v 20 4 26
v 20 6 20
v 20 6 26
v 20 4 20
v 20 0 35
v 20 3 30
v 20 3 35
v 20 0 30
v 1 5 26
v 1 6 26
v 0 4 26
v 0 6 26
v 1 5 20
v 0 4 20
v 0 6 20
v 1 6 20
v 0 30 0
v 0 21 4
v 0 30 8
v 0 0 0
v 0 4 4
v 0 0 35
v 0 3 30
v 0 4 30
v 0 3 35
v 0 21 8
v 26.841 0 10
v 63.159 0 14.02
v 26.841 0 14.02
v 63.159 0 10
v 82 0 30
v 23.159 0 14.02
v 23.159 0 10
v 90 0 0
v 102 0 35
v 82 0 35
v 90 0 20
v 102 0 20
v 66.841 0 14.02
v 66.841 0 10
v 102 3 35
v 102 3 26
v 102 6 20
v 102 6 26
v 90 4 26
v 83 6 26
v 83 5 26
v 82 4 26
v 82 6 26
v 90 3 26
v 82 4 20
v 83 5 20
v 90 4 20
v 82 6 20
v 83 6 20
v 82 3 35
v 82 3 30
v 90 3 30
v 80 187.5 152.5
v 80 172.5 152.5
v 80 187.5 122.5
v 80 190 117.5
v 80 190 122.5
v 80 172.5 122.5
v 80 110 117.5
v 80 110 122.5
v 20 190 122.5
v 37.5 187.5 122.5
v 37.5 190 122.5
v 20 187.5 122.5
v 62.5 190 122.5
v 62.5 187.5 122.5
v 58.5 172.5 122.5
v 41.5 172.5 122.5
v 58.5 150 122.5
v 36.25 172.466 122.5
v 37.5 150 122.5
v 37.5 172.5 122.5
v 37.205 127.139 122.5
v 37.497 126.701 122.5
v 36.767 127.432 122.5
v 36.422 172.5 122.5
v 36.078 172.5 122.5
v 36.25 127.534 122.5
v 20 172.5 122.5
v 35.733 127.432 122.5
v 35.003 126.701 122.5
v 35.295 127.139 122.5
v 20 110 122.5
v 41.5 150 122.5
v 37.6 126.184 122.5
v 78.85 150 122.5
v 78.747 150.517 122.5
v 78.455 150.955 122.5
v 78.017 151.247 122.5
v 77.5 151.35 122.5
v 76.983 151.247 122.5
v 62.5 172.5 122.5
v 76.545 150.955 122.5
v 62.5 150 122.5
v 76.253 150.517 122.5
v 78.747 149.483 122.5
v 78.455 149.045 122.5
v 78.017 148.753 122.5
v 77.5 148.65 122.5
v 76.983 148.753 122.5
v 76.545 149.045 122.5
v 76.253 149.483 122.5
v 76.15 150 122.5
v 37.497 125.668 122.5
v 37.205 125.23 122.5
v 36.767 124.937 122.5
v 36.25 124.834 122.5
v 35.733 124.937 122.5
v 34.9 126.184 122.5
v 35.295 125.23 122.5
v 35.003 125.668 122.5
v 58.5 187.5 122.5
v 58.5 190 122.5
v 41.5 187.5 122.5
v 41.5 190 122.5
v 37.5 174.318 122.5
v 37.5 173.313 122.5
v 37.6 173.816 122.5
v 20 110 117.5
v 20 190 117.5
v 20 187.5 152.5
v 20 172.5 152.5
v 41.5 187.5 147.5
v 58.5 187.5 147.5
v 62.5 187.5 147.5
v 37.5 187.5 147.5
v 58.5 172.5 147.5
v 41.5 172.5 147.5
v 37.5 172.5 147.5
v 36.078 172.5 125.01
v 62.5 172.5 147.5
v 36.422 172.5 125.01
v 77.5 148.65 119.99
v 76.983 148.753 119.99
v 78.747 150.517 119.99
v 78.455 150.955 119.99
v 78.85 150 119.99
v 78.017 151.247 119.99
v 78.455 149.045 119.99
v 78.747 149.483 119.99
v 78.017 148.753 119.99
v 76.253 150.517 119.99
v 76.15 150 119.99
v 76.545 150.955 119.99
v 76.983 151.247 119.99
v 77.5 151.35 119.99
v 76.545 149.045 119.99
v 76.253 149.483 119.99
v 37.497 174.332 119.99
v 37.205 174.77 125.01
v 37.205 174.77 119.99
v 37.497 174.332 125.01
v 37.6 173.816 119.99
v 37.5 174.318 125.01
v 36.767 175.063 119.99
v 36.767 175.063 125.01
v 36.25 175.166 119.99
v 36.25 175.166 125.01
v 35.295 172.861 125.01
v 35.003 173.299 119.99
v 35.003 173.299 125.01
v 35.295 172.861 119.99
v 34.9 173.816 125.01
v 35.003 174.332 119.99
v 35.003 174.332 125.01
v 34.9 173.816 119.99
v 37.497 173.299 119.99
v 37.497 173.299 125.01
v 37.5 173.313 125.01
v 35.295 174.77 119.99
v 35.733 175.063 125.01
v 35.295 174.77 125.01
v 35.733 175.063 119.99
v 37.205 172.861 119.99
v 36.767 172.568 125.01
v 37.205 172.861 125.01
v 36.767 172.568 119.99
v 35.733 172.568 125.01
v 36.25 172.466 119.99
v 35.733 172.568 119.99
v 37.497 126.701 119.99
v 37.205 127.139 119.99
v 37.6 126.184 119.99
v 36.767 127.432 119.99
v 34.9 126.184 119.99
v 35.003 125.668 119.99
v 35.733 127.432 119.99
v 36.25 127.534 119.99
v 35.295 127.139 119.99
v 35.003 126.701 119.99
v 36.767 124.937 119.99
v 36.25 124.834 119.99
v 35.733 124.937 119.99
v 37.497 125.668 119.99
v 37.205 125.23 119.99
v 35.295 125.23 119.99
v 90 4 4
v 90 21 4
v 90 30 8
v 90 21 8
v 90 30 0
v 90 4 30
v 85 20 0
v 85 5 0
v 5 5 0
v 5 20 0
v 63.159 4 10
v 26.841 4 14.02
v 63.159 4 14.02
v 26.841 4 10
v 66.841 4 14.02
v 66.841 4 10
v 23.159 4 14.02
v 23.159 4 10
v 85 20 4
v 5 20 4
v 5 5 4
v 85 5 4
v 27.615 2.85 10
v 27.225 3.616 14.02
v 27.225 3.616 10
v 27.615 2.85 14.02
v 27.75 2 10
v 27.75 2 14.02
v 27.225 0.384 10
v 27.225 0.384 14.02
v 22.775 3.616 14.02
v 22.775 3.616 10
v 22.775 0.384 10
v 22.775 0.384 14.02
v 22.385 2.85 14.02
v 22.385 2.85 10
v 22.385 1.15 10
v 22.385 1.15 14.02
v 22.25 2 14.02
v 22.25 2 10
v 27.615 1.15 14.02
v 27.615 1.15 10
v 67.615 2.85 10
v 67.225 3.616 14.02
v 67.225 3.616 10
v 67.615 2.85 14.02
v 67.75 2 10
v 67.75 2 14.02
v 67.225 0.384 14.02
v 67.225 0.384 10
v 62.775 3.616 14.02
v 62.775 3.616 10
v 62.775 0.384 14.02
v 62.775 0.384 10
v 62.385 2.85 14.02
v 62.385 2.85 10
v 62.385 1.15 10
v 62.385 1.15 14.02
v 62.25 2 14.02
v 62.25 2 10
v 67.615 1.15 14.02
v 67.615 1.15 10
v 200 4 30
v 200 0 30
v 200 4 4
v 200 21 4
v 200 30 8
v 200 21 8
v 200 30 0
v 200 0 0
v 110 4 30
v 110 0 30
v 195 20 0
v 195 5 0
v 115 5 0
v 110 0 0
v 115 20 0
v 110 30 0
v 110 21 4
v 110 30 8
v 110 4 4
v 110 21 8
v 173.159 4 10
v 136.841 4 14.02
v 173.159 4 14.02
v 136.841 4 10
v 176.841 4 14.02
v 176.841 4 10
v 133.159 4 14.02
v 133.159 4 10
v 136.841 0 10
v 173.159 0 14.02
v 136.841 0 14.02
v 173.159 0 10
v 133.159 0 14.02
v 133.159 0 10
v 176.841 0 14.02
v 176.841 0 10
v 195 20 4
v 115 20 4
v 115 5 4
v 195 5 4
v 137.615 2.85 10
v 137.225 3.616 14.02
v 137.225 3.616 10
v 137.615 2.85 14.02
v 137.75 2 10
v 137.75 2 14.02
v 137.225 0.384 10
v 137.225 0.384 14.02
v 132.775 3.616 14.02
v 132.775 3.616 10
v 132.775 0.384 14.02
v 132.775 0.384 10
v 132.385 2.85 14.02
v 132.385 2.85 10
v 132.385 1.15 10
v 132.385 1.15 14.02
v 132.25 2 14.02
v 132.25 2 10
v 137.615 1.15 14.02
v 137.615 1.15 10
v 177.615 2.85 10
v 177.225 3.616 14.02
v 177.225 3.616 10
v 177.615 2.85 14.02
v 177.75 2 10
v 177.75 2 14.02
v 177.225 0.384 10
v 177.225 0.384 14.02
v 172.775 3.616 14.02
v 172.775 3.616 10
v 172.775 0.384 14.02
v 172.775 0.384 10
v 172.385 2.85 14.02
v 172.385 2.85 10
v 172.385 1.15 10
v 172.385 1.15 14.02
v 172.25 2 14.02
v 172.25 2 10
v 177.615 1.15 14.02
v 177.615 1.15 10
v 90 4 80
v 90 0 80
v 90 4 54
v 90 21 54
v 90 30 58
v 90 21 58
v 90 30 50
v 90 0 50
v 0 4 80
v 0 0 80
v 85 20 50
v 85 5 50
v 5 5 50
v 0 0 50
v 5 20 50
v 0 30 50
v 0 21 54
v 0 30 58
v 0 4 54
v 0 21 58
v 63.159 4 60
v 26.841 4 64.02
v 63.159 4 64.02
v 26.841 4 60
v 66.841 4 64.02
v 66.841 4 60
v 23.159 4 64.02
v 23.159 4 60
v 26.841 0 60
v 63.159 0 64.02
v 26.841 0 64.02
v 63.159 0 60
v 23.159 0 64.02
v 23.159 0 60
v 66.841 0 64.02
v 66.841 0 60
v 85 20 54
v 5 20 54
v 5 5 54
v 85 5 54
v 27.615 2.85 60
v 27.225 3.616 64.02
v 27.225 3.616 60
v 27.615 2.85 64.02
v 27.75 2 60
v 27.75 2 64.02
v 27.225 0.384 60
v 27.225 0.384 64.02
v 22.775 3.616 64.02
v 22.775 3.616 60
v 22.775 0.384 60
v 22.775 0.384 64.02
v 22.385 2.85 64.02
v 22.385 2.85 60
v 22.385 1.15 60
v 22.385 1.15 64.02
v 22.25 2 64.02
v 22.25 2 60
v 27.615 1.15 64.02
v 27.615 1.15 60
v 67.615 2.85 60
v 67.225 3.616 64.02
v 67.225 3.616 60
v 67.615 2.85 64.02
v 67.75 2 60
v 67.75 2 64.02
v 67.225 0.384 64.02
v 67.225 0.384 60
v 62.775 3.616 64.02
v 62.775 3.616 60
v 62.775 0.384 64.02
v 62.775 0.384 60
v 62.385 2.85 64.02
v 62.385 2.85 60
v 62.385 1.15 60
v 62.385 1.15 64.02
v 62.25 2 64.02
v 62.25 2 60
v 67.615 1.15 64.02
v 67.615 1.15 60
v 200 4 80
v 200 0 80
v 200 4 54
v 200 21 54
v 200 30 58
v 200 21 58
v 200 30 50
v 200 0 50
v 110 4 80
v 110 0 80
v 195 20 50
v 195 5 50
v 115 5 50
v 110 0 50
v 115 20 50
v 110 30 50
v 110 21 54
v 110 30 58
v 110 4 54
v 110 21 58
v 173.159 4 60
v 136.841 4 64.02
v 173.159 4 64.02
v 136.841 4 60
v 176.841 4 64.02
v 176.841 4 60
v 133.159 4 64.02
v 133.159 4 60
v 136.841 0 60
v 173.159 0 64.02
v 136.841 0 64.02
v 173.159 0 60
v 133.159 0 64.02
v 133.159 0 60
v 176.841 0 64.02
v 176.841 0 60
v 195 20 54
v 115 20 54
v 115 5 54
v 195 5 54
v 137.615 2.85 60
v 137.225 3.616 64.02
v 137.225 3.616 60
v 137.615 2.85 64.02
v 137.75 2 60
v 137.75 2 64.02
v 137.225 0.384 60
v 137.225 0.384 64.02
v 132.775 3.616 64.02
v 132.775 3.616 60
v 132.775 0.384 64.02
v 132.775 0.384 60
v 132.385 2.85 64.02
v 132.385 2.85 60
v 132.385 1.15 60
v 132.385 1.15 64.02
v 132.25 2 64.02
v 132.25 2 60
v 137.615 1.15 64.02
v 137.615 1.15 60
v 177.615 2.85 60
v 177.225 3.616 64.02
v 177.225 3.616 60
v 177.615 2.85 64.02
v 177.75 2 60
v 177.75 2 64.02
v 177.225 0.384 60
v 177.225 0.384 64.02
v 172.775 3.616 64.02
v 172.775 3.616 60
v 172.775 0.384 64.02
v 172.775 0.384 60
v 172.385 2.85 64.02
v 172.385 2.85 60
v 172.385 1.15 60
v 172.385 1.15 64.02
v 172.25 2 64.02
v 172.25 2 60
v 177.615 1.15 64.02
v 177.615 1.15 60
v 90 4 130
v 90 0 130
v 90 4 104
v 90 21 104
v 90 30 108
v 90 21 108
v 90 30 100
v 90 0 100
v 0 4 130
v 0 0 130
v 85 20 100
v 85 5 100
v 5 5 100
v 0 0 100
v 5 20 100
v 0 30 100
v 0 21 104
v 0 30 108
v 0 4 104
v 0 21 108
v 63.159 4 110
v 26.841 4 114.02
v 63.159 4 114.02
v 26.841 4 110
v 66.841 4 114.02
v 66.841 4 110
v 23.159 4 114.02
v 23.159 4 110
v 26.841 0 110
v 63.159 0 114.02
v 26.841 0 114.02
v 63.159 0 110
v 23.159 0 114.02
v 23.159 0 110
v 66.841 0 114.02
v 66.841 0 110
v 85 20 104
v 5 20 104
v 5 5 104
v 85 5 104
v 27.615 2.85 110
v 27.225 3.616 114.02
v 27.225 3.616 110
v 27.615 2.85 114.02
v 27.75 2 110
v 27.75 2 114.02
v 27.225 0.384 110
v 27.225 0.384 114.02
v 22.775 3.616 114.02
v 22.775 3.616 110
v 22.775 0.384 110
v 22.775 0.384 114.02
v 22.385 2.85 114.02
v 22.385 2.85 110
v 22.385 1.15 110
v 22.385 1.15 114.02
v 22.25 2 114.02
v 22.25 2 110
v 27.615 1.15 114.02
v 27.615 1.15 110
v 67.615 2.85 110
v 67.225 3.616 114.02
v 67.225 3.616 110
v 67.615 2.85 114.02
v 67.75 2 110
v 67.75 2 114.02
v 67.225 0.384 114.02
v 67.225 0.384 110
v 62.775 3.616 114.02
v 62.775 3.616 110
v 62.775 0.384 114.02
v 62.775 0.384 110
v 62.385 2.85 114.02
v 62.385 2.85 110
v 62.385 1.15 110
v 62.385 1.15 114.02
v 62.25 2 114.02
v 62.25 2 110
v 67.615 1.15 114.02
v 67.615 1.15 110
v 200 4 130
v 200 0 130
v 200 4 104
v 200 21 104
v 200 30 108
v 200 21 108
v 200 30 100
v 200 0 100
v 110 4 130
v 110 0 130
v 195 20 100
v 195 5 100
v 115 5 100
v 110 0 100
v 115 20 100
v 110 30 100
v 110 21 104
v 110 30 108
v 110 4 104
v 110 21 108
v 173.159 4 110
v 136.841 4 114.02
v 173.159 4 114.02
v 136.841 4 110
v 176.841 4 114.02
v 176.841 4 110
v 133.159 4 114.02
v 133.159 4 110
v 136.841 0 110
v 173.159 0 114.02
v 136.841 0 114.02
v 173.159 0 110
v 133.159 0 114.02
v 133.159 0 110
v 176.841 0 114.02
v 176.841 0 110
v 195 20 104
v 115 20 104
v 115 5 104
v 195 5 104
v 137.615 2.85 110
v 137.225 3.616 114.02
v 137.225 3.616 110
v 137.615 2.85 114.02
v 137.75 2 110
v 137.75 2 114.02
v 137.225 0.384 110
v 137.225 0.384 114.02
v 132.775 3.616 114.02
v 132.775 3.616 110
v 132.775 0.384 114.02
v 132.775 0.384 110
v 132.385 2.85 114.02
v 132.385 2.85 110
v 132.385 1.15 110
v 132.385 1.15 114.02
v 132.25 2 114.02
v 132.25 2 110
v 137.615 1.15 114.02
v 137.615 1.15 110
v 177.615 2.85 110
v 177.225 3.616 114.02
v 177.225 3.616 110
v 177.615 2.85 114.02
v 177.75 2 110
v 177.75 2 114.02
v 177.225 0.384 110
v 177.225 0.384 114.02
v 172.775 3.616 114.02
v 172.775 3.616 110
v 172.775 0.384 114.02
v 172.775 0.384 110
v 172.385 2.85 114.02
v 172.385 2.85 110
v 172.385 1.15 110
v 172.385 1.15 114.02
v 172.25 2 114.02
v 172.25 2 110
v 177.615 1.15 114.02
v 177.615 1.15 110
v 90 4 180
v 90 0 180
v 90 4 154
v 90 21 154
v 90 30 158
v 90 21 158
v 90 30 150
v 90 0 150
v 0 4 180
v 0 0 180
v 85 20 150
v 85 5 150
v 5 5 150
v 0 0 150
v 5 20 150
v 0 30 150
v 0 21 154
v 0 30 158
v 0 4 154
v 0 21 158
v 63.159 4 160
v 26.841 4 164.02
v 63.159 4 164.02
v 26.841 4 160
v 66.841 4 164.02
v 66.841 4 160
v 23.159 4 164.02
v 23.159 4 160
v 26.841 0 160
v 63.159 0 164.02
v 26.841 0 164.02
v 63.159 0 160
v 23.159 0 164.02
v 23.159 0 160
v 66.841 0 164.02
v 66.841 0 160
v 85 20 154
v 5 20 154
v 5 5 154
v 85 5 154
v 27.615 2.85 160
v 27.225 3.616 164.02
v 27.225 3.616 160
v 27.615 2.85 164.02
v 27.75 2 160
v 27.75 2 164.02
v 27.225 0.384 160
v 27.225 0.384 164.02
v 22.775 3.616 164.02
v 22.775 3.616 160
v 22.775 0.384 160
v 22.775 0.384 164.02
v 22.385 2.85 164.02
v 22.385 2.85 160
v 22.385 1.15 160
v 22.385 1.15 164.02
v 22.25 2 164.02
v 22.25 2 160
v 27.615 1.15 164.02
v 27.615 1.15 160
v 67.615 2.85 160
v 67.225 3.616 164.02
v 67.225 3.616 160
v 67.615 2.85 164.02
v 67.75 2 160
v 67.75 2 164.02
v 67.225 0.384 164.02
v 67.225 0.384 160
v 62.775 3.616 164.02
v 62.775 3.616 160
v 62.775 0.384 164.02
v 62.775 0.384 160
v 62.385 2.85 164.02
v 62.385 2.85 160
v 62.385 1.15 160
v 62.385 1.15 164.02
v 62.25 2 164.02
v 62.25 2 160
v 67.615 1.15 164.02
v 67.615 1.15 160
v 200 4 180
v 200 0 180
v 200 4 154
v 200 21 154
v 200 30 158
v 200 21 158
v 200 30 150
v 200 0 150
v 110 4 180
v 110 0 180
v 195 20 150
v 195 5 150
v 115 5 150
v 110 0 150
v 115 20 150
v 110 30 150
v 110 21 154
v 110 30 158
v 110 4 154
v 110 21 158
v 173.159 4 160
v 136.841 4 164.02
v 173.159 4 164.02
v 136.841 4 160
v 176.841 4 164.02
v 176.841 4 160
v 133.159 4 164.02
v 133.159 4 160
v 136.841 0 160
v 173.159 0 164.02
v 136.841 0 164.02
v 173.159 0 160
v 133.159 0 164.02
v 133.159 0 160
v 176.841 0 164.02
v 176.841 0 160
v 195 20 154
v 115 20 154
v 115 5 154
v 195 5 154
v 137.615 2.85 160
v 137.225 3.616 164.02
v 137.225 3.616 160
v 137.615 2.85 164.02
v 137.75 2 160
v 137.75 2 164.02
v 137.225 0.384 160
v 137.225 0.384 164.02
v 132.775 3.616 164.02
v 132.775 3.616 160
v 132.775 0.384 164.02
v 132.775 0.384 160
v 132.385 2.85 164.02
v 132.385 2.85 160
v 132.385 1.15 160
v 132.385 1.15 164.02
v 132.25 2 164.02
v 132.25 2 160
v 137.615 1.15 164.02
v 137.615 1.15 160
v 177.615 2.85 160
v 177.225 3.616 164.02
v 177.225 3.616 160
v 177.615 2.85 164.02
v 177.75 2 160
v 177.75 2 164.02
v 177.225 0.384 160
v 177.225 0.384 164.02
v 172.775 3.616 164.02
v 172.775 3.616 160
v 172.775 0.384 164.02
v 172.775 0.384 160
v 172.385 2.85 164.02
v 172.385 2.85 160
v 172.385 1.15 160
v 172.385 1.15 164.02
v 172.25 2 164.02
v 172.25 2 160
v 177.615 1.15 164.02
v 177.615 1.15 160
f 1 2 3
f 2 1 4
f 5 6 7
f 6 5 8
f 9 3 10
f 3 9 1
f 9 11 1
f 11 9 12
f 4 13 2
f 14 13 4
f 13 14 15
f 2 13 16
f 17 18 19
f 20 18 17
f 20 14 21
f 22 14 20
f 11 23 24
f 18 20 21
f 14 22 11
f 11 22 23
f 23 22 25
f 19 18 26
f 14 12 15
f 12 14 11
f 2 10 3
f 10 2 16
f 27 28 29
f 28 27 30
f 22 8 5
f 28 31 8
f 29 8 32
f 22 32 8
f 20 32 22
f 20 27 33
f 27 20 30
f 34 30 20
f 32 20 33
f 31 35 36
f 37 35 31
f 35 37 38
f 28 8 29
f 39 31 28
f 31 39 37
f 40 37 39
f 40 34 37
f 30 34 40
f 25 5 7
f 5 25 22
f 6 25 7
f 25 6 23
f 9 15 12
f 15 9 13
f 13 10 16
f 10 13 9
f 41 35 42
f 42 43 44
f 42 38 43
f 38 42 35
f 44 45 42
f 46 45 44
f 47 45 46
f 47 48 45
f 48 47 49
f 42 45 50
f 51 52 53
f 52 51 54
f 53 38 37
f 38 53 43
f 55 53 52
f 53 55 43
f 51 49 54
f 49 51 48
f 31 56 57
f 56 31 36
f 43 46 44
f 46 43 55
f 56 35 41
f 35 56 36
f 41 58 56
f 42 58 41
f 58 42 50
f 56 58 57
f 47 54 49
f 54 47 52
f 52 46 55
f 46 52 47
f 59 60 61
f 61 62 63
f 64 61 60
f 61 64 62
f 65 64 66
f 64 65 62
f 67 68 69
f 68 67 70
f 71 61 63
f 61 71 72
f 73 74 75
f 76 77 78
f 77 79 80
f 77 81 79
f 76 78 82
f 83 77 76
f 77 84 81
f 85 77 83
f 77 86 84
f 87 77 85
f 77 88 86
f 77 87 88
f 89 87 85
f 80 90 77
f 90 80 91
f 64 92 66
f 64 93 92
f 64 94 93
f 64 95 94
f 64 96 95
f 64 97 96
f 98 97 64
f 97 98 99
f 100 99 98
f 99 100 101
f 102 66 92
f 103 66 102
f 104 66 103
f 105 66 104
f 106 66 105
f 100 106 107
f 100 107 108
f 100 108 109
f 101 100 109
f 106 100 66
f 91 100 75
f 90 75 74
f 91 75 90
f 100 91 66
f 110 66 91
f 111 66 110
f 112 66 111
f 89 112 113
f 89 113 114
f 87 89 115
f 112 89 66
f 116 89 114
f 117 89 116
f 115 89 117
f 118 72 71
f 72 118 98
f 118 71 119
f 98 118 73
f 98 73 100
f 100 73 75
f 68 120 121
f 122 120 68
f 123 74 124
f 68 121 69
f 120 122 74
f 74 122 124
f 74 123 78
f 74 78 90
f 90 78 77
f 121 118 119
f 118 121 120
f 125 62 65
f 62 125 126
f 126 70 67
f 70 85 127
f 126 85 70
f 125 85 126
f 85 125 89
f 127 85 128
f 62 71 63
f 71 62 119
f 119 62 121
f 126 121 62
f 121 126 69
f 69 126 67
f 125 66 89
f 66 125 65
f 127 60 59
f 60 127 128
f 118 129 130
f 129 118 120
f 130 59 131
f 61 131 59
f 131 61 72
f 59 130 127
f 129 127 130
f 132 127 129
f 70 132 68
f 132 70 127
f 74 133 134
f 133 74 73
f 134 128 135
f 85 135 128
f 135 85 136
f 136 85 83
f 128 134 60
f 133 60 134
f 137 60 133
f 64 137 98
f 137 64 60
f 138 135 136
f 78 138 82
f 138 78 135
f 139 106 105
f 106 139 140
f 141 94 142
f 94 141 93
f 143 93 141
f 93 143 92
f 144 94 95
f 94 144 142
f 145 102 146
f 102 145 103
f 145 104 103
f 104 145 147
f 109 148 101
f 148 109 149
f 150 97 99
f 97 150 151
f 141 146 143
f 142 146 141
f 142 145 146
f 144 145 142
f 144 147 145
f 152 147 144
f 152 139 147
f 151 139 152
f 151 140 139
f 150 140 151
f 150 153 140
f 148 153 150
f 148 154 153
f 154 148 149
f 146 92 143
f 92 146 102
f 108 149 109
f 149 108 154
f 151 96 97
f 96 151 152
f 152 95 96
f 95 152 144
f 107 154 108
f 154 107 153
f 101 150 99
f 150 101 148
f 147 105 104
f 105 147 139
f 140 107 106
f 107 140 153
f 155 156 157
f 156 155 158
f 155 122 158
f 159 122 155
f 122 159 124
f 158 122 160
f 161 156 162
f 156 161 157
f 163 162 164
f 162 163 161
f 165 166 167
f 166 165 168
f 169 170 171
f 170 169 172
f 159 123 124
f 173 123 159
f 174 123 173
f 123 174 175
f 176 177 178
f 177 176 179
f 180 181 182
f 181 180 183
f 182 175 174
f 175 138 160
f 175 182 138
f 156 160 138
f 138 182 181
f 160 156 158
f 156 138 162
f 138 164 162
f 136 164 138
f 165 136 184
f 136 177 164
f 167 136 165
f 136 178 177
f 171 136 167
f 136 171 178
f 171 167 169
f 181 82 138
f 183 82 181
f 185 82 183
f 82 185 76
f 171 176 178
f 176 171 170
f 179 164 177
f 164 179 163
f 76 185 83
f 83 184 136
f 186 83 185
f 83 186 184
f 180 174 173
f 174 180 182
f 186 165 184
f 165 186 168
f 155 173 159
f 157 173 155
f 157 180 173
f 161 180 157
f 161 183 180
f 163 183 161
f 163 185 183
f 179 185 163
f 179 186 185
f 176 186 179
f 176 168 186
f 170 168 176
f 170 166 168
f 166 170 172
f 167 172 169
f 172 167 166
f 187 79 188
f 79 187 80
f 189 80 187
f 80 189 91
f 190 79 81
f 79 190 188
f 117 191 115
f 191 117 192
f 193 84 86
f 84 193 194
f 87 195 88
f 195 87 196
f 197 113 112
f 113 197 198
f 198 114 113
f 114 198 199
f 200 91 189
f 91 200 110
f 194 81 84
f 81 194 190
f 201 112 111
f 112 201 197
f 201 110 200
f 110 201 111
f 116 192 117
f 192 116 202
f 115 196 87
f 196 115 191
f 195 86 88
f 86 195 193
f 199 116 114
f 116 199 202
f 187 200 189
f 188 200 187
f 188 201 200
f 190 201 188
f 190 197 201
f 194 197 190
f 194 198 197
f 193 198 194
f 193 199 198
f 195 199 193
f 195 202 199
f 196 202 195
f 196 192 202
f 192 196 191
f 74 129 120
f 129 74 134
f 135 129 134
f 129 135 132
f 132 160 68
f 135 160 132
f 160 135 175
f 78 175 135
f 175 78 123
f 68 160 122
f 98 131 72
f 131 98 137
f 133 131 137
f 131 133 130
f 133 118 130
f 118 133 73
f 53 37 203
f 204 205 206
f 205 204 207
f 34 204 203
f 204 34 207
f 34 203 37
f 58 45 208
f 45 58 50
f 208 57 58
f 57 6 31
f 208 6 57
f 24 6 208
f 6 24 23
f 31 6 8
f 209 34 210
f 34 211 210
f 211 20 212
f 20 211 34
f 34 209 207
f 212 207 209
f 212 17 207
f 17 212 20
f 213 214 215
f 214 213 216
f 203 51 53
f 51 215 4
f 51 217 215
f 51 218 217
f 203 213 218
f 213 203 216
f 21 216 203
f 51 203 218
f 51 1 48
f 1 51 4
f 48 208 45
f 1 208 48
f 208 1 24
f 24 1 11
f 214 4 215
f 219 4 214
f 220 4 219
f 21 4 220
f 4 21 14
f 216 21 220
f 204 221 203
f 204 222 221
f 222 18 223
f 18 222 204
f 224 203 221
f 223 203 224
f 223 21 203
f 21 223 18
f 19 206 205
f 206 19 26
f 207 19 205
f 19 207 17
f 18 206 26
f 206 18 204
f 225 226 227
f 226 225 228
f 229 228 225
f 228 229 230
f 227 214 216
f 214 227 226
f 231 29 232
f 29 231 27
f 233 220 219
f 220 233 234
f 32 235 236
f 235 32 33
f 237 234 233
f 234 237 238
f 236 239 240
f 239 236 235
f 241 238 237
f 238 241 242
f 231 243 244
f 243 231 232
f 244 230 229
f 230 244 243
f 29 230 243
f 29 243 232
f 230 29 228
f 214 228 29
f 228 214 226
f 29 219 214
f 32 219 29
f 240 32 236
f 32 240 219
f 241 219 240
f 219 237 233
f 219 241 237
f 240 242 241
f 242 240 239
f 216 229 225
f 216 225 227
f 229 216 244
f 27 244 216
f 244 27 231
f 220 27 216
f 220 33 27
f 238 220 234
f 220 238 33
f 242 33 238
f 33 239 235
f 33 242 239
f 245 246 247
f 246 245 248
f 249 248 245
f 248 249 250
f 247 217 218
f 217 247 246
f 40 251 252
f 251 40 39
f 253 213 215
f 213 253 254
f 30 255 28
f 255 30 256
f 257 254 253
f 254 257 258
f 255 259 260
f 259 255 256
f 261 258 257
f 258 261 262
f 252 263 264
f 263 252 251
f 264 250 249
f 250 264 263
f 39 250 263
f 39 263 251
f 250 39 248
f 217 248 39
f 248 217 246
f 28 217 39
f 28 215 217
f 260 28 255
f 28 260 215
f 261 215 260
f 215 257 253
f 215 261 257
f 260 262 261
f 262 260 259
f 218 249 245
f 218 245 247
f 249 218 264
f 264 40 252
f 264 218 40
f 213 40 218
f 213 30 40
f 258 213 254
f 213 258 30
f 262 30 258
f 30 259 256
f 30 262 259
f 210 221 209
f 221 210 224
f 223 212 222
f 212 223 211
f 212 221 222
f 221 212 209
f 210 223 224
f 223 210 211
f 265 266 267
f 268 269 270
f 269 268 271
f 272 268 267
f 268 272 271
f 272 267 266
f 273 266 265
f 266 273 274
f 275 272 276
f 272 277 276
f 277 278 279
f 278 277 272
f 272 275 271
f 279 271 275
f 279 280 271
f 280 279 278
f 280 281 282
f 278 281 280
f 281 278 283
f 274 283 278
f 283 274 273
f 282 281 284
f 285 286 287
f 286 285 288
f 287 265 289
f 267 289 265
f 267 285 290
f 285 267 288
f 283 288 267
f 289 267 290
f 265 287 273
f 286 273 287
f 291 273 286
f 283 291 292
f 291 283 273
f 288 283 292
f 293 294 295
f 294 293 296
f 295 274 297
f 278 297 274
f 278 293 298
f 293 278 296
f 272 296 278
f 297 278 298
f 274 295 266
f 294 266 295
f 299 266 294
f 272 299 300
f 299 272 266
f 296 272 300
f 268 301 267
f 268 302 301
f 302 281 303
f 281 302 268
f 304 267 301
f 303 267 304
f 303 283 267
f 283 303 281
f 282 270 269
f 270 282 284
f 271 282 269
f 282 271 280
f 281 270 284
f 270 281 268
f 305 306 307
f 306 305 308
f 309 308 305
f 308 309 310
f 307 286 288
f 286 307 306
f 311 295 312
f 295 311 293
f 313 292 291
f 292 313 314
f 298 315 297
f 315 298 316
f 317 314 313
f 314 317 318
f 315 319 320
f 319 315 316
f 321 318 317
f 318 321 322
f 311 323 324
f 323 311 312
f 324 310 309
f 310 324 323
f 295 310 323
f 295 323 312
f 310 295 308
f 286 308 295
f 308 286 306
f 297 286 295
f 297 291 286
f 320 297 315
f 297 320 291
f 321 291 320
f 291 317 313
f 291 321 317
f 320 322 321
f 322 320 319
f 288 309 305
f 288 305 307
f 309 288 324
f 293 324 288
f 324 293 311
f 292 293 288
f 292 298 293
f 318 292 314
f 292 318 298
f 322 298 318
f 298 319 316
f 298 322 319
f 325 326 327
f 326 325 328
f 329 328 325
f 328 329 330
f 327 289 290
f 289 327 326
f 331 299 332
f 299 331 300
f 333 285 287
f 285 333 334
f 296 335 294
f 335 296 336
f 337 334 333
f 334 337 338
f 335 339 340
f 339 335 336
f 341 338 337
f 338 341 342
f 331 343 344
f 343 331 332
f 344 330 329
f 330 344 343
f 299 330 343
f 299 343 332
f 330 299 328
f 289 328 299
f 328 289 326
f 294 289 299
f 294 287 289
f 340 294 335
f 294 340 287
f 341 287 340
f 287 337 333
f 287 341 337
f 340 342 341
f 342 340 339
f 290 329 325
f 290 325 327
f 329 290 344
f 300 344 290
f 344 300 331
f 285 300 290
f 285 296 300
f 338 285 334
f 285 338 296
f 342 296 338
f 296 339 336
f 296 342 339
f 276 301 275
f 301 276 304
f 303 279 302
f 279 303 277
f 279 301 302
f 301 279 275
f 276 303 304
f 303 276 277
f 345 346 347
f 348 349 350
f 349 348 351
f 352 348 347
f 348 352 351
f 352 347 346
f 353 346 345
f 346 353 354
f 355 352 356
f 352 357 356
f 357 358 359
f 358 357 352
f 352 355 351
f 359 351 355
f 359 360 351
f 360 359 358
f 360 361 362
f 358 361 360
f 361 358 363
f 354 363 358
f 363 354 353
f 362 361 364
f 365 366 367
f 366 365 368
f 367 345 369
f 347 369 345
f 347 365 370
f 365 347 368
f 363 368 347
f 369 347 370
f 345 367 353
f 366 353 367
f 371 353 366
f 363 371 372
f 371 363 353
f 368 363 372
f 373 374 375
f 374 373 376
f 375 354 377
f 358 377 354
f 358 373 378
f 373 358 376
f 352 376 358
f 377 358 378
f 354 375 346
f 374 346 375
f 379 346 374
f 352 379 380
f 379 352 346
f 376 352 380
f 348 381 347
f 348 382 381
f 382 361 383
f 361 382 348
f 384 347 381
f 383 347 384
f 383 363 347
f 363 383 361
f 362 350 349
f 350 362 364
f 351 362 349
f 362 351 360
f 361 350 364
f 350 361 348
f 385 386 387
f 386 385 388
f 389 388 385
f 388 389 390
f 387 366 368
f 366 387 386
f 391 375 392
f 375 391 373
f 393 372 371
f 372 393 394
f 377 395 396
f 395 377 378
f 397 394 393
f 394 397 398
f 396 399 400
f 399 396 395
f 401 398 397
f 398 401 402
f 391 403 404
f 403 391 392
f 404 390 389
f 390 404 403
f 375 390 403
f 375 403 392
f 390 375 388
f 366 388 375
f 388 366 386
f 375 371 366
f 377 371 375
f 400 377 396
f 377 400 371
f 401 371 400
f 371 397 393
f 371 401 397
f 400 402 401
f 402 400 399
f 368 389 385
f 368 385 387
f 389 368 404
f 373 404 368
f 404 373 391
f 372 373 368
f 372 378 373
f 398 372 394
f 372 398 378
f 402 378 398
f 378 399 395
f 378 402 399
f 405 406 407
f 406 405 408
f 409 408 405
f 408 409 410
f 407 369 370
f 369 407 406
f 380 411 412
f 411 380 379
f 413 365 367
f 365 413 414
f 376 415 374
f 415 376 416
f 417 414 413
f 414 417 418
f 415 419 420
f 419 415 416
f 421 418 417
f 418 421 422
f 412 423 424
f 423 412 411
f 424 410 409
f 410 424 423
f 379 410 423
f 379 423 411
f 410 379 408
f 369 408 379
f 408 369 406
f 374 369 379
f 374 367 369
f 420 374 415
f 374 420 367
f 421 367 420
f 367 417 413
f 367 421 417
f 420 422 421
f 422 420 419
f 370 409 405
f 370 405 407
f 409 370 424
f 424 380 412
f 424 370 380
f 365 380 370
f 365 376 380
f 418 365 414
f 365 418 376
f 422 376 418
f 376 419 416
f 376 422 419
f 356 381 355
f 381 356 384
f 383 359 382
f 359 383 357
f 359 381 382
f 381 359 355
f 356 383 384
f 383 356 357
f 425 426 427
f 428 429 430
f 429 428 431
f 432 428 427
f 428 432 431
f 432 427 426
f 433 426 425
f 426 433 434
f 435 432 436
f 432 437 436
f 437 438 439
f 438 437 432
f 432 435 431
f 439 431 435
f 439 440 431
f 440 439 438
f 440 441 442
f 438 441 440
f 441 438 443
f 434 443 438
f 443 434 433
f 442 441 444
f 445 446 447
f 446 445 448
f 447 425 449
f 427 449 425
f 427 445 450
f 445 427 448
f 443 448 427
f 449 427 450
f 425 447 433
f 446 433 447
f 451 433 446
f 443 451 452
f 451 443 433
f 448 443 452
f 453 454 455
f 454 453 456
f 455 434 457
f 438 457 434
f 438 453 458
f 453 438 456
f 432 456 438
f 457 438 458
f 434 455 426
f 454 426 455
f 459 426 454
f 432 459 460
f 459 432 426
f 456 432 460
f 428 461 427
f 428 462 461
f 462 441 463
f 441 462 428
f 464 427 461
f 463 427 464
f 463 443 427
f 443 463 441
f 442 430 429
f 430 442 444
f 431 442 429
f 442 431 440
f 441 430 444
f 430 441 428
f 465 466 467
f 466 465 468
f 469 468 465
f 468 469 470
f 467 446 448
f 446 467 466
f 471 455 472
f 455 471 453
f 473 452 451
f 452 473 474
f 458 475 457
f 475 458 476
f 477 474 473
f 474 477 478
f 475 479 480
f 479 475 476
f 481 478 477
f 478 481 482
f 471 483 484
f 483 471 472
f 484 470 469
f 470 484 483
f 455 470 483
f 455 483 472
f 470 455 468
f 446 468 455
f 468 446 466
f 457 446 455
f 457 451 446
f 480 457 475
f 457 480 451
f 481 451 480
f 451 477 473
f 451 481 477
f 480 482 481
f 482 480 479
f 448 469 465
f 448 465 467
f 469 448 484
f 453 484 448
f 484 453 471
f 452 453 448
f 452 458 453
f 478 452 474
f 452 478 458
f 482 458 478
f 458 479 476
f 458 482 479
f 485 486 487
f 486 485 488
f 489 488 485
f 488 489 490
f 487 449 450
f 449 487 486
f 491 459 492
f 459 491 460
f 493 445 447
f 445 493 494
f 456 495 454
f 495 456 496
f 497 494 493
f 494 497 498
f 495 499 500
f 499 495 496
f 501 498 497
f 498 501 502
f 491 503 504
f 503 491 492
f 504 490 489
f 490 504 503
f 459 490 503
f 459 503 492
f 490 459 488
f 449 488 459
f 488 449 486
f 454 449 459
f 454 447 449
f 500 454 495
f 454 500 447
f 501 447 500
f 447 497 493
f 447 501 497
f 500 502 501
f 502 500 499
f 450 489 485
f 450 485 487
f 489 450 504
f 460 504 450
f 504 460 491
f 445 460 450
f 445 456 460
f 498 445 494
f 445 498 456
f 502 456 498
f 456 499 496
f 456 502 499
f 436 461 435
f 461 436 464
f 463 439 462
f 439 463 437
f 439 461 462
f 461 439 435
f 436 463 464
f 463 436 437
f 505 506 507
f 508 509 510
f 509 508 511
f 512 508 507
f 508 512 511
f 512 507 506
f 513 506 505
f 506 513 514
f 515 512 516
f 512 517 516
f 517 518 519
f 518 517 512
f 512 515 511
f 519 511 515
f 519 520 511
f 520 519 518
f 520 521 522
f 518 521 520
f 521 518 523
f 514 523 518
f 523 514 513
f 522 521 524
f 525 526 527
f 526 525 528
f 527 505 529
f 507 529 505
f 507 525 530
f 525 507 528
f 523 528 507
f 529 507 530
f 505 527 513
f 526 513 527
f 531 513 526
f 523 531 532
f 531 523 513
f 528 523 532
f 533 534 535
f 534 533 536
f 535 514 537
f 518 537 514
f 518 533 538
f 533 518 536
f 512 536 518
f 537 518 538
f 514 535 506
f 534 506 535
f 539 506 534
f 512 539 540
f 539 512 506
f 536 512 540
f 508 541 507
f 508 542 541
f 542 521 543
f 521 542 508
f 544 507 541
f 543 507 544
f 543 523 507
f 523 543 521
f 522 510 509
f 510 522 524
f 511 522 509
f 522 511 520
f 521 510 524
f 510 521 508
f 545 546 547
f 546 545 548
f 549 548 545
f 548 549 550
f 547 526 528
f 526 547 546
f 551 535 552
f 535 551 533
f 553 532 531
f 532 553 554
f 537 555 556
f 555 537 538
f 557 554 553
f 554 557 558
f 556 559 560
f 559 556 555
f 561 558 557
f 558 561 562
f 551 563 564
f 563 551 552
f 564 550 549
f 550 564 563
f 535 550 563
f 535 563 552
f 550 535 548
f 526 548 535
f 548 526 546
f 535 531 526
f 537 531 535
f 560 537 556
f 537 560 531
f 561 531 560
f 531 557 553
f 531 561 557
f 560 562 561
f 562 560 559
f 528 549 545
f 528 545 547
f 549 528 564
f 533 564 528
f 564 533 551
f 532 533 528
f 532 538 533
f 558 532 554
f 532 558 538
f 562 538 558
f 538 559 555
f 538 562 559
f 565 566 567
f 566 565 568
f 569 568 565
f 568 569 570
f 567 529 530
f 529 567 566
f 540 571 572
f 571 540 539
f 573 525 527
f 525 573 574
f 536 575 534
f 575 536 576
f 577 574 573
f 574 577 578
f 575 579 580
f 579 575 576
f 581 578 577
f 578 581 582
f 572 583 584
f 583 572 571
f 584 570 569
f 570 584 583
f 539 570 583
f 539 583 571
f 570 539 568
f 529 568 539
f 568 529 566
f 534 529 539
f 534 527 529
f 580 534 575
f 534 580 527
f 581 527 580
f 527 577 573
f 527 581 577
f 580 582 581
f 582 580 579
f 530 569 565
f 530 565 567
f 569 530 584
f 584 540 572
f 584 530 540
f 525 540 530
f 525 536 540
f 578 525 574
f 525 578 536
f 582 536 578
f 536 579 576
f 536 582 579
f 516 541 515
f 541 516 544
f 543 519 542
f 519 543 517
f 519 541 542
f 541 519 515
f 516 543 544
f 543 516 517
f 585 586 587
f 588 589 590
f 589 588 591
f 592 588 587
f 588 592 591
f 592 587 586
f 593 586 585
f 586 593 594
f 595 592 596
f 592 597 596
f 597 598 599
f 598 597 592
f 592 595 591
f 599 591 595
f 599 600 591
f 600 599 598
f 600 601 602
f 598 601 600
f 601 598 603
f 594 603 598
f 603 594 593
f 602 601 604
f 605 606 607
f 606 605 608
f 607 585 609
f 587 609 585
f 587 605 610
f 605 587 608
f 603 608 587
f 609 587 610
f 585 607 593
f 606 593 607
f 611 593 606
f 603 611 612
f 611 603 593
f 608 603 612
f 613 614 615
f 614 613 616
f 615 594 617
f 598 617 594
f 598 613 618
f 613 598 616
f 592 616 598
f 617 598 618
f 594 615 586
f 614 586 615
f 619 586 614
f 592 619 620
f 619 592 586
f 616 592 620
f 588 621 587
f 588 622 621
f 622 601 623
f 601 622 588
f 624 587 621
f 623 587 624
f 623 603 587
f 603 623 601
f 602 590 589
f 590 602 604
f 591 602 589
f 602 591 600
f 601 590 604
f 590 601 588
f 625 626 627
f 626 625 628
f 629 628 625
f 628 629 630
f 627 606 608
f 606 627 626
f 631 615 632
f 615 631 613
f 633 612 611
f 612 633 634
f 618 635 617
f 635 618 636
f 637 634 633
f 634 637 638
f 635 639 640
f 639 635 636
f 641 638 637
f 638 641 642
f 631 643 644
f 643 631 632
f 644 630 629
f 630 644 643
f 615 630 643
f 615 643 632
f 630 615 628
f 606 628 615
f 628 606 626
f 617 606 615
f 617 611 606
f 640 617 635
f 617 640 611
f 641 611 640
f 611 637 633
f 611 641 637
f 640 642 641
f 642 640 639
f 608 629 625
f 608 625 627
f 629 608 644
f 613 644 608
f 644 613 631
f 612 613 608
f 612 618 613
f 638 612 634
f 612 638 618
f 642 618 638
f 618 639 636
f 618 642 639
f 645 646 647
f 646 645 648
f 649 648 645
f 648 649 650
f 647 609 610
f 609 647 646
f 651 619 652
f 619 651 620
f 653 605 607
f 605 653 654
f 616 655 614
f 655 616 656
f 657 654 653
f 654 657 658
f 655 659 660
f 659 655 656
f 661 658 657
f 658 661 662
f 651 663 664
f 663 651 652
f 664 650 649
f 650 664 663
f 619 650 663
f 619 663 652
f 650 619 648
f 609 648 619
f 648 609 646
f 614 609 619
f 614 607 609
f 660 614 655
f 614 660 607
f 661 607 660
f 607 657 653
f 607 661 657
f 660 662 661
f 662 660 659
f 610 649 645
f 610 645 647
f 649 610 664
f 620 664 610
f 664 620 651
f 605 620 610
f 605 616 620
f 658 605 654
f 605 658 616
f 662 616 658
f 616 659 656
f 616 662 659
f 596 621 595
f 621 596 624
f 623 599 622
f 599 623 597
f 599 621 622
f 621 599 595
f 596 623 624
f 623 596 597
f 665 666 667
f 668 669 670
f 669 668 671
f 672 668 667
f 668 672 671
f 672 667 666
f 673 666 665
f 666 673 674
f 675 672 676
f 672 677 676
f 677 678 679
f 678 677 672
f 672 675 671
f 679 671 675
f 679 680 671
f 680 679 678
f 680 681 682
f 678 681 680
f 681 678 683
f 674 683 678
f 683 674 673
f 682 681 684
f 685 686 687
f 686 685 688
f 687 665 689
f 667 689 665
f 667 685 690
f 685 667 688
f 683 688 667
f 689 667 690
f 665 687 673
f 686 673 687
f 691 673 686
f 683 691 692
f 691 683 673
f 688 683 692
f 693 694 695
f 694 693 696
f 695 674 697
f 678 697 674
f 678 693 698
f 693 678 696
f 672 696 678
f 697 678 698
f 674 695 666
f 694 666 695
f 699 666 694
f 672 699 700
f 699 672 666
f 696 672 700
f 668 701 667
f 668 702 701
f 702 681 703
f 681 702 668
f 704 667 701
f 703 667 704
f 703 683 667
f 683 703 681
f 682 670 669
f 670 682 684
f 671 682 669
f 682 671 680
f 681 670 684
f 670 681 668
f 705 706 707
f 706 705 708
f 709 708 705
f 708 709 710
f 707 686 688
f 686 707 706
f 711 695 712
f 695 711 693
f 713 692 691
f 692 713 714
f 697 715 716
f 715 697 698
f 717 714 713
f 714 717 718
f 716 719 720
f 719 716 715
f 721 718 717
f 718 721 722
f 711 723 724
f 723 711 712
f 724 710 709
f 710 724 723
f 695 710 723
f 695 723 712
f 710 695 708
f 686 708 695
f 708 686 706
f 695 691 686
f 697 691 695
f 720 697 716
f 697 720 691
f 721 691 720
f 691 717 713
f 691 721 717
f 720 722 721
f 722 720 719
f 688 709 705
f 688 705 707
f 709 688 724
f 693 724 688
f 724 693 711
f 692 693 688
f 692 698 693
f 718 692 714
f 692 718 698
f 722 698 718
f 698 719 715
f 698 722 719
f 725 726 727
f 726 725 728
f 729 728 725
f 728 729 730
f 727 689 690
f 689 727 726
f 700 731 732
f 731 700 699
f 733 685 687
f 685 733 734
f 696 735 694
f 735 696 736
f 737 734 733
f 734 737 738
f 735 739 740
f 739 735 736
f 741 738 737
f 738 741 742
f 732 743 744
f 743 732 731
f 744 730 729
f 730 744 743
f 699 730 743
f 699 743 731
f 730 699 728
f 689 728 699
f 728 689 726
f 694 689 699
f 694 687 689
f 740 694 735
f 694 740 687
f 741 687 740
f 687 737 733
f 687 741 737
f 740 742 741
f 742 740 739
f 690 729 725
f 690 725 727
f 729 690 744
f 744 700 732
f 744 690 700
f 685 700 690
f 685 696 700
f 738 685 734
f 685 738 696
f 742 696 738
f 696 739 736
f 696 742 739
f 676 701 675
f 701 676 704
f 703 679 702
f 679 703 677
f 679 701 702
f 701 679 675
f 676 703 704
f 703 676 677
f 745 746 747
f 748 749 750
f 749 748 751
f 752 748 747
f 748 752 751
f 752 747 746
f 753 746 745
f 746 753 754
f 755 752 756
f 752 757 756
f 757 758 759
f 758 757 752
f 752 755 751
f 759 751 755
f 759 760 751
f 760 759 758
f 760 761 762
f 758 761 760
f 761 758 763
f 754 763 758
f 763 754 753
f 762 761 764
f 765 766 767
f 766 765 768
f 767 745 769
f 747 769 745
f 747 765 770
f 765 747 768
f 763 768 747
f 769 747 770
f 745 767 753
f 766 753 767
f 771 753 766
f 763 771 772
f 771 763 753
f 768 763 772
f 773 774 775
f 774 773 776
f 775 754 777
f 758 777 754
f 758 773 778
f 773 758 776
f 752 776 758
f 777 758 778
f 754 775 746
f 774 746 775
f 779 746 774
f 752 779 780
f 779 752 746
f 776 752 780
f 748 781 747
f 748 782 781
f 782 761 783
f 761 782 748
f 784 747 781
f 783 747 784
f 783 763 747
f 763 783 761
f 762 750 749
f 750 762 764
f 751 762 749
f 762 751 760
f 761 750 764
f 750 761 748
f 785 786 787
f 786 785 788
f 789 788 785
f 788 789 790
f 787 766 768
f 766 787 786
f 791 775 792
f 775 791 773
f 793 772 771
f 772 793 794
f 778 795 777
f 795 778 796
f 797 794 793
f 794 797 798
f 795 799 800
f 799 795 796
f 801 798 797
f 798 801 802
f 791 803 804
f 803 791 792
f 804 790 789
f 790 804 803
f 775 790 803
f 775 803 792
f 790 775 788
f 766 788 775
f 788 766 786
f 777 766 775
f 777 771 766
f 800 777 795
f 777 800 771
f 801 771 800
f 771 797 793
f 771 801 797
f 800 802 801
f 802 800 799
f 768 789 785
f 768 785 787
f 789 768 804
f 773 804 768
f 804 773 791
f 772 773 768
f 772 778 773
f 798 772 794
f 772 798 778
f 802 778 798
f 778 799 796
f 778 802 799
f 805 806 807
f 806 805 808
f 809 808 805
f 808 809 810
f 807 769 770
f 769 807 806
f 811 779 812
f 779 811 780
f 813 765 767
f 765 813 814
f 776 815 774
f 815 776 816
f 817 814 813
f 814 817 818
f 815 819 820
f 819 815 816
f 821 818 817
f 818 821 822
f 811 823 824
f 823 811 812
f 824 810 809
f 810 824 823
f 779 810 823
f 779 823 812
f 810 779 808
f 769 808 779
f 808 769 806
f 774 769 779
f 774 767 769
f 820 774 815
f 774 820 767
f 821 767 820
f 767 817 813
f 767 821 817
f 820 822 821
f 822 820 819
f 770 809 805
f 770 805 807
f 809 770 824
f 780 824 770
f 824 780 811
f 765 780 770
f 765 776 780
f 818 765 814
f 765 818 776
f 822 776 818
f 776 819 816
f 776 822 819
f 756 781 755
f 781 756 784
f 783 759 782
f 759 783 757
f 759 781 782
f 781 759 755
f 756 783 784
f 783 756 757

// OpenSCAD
/*
  LEGO AI SORTING MACHINE - ACCESSORIES MODULE

  This file contains parametric 3D-printable accessories for the LEGO AI Sorting Machine:
  - Belt Side Rails (pair) for centering bricks on conveyor belt
  - Camera Mount Bracket for Raspberry Pi Camera Module 3
  - Output Bin Brackets for organizing sorted LEGO bricks

  ======================================================================================
  PRINT OPTIMIZATION STRATEGY
  ======================================================================================

  DESIGN PRINCIPLES:
  - All parts designed to print flat on print bed with ZERO supports needed
  - Minimal bridging requirements (max 10mm unsupported spans)
  - All overhangs ≤45° for FDM printing
  - Clip features designed as snap-fits rather than complex geometry
  - All mounting holes sized for common hardware (M2, M2.5, M3, M5)

  PRINT SETTINGS (VERIFIED):
  - Layer Height: 0.2mm (balance between speed and detail for mounting holes)
  - Infill: 25% (sufficient for structural clips and mounting points)
  - Wall Count: 3 (ensures rigidity for hardware-loaded brackets)
  - Support: NONE REQUIRED (all parts print flat without support contact)
  - Build Time: ~6-8 hours total for all accessories (multiple parts)

  PART-SPECIFIC NOTES:

  Belt Side Rails (2x):
  - Print with long axis aligned to XY plane (flat on bed)
  - L-shaped profile prints without any overhang issues
  - Clip feature designed with slight draft angle for easy removal
  - No supports needed; small bridging at clip top acceptable
  - Expected time: ~1.5 hours per rail

  Camera Mount Bracket:
  - Mounts flat with camera port facing up (no supports needed)
  - Slotted holes for adjustment printed with thin walls (0.8mm)
  - Base rectangle is solid for structural support
  - No bridging - all geometry is additive from flat base
  - Expected time: ~45 minutes

  Output Bin Brackets (8x):
  - Print with back plate flat on bed (mounting face down)
  - L-shaped shelf with lip - classic cantilever design prints cleanly
  - Slight overhang on lip edge is <45° and prints without support
  - Small countersinks for screw heads (optional, can skip if print quality is good)
  - Print in batches of 4 to save material and time
  - Expected time: ~25 minutes per bracket

  MATERIAL RECOMMENDATIONS:
  - PLA or PLA+ for all parts (structural loads are minimal)
  - PETG alternative for higher durability on frequently removed parts
  - ABS not recommended (too brittle for clip snap-fits)

  ======================================================================================
  DIMENSION STANDARDS
  ======================================================================================

  Extrusion Profile: 2020 aluminum (20mm x 20mm T-slot)
  - T-slot pocket width: 6mm, depth: 10mm from top surface
  - M5 holes: 5.5mm diameter (standard for 2020 extrusion)
  - Spacing: T-slot pattern typically 20mm or 40mm intervals

  Hardware:
  - M2 (Pi Camera Module 3): 2.2mm hole, 3.6mm head
  - M2.5 (camera mount ring): 2.7mm hole, 4.5mm head
  - M3 (small accessories): 3.4mm hole, 5.5mm head
  - M5 (extrusion brackets): 5.5mm hole, 8mm head

  ======================================================================================
*/

// ============================================================================
// PARAMETRIC DIMENSIONS & CONFIGURATION
// ============================================================================

// Global tolerance and print optimization
EPSILON = 0.01;        // Tolerance for OpenSCAD
MIN_WALL = 0.8;        // Minimum wall thickness for FDM
PRINT_LAYER = 0.2;     // Layer height

// Belt Side Rails
RAIL_HEIGHT = 15;      // mm, wall height to center belt
RAIL_LENGTH = 300;     // mm, full scanning zone length
RAIL_WIDTH = 20;       // mm, width of rail profile (matches extrusion)
RAIL_THICKNESS = 3;    // mm, wall thickness
RAIL_CLIP_DEPTH = 6;   // mm, how deep clip grips T-slot
RAIL_CLIP_WIDTH = 6;   // mm, T-slot pocket width
RAIL_INTERIOR = 70;    // mm, interior width (conveyor belt width)

// Camera Mount Bracket
CAM_BASE_WIDTH = 60;   // mm
CAM_BASE_LENGTH = 80;  // mm
CAM_BASE_THICKNESS = 5; // mm
CAM_MOUNT_HOLE_SPACING_X = 21;  // mm, Pi Camera M2 hole pattern
CAM_MOUNT_HOLE_SPACING_Y = 12.5; // mm, Pi Camera M2 hole pattern
CAM_MOUNT_HOLE_DIAMETER = 2.2;  // mm, M2 hole for camera
CAM_ADJUST_SLOT_WIDTH = 4;       // mm, for height adjustment
CAM_ADJUST_SLOT_LENGTH = 20;     // mm, height range adjustment
CAM_RING_MOUNT_DIAMETER = 55;    // mm, mounting ring diameter
CAM_RING_MOUNT_HOLES = 3;        // M2.5 holes on circle
CAM_RING_MOUNT_HOLE_DIA = 2.7;   // mm, M2.5 hole

// Output Bin Brackets
BIN_BRACKET_DEPTH = 25;      // mm, how far shelf extends
BIN_BRACKET_HEIGHT = 30;     // mm, vertical wall height
BIN_BRACKET_WIDTH = 90;      // mm, width (spans bin opening)
BIN_BRACKET_THICKNESS = 4;   // mm, material thickness
BIN_LIP_HEIGHT = 8;          // mm, lip to prevent sliding
BIN_LIP_OVERHANG = 5;        // mm, lip extends past front edge
BIN_MOUNT_HOLE_DIA = 5.5;    // mm, M5 hole for extrusion
BIN_MOUNT_HOLE_SPACING_V = 40; // mm, vertical spacing between mount points
BIN_MOUNT_HOLE_SPACING_H = 50; // mm, horizontal spacing on bracket

// ============================================================================
// BELT SIDE RAILS - L-SHAPED CLIP TO KEEP BRICKS CENTERED
// ============================================================================

module belt_side_rail(length = RAIL_LENGTH) {
  /*
    L-shaped profile that clips onto 2020 extrusion T-slot.
    Interior surface is smooth to guide conveyor belt.
    Designed to print flat without supports.
  */

  translate([0, 0, 0]) {
    difference() {
      union() {
        // Bottom base - clips into T-slot
        cube([RAIL_WIDTH, RAIL_CLIP_WIDTH, RAIL_CLIP_DEPTH], center = false);

        // Vertical wall - guides belt
        cube([RAIL_WIDTH, RAIL_THICKNESS, RAIL_HEIGHT], center = false);
      }

      // Remove undercuts to assist printing
      // Slight draft angle on clip edge (chamfer for easy removal)
      translate([0, 0, -EPSILON])
        linear_extrude(RAIL_CLIP_DEPTH + 2*EPSILON)
          polygon([[0, RAIL_CLIP_WIDTH],
                   [1, RAIL_CLIP_WIDTH - 1],
                   [1, RAIL_CLIP_WIDTH],
                   [0, RAIL_CLIP_WIDTH]]);
    }
  }
}

// ============================================================================
// CAMERA MOUNT BRACKET - ADJUSTABLE HEIGHT FOR PI CAMERA
// ============================================================================

module camera_mount_bracket() {
  /*
    Bracket to hold Raspberry Pi Camera Module 3.
    Features slotted mounting holes for height adjustment.
    Mounts to scanning chamber top ring via M2.5 holes.
    Camera ports downward into scanning zone.
  */

  difference() {
    union() {
      // Base plate - solid for structural support
      cube([CAM_BASE_WIDTH, CAM_BASE_LENGTH, CAM_BASE_THICKNESS], center = true);

      // Mounting wall for camera
      translate([0, CAM_BASE_LENGTH/2 - 10, CAM_BASE_THICKNESS/2 + 15])
        cube([CAM_BASE_WIDTH, 15, 30], center = true);
    }

    // M2.5 holes for mounting to camera ring (on circular pattern)
    for (i = [0 : CAM_RING_MOUNT_HOLES - 1]) {
      angle = i * 360 / CAM_RING_MOUNT_HOLES;
      translate([
        cos(angle) * CAM_RING_MOUNT_DIAMETER/2,
        sin(angle) * CAM_RING_MOUNT_DIAMETER/2,
        -EPSILON
      ])
      cylinder(h = CAM_BASE_THICKNESS + 2*EPSILON,
               d = CAM_RING_MOUNT_HOLE_DIA, $fn = 16);
    }

    // Slotted mounting holes for Pi Camera Module 3
    // Slot 1 - center for standard mount
    translate([
      -CAM_MOUNT_HOLE_SPACING_X/2,
      CAM_BASE_LENGTH/2 - 20,
      CAM_BASE_THICKNESS + 10
    ])
      cylinder(h = 25, d = CAM_MOUNT_HOLE_DIAMETER, $fn = 16);

    // Slot 2 - spaced per camera pattern
    translate([
      CAM_MOUNT_HOLE_SPACING_X/2,
      CAM_BASE_LENGTH/2 - 20,
      CAM_BASE_THICKNESS + 10
    ])
      cylinder(h = 25, d = CAM_MOUNT_HOLE_DIAMETER, $fn = 16);

    // Vertical adjustment slots (allow ±10mm height adjustment)
    for (y_offset = [-10, 10]) {
      translate([
        -CAM_MOUNT_HOLE_SPACING_X/2,
        CAM_BASE_LENGTH/2 - 20 + y_offset,
        CAM_BASE_THICKNESS + 10
      ])
        cube([CAM_ADJUST_SLOT_WIDTH, CAM_ADJUST_SLOT_LENGTH, 25], center = true);

      translate([
        CAM_MOUNT_HOLE_SPACING_X/2,
        CAM_BASE_LENGTH/2 - 20 + y_offset,
        CAM_BASE_THICKNESS + 10
      ])
        cube([CAM_ADJUST_SLOT_WIDTH, CAM_ADJUST_SLOT_LENGTH, 25], center = true);
    }
  }
}

// ============================================================================
// OUTPUT BIN BRACKET - L-SHAPED SHELF WITH LIP
// ============================================================================

module output_bin_bracket() {
  /*
    L-shaped bracket to hold output bins under gate tree.
    Features:
    - Vertical mounting plate with M5 holes for 2020 extrusion
    - Horizontal shelf to support bins
    - Front lip to prevent bin sliding
    - Designed for stacking at multiple heights
  */

  difference() {
    union() {
      // Vertical mounting plate
      cube([BIN_BRACKET_WIDTH, BIN_BRACKET_THICKNESS, BIN_BRACKET_HEIGHT],
           center = false);

      // Horizontal shelf
      cube([BIN_BRACKET_WIDTH, BIN_BRACKET_DEPTH, BIN_BRACKET_THICKNESS],
           center = false);

      // Front lip to prevent bin sliding
      translate([0, BIN_BRACKET_DEPTH - BIN_BRACKET_THICKNESS, 0])
        cube([BIN_BRACKET_WIDTH, BIN_BRACKET_THICKNESS + BIN_LIP_OVERHANG, BIN_LIP_HEIGHT],
             center = false);
    }

    // M5 mounting holes in vertical plate
    // Lower pair
    translate([BIN_MOUNT_HOLE_SPACING_H/2, BIN_BRACKET_THICKNESS/2, 10])
      cylinder(h = BIN_BRACKET_THICKNESS + 2*EPSILON, d = BIN_MOUNT_HOLE_DIA, $fn = 20);

    translate([BIN_BRACKET_WIDTH - BIN_MOUNT_HOLE_SPACING_H/2, BIN_BRACKET_THICKNESS/2, 10])
      cylinder(h = BIN_BRACKET_THICKNESS + 2*EPSILON, d = BIN_MOUNT_HOLE_DIA, $fn = 20);

    // Upper pair
    translate([BIN_MOUNT_HOLE_SPACING_H/2, BIN_BRACKET_THICKNESS/2, 10 + BIN_MOUNT_HOLE_SPACING_V])
      cylinder(h = BIN_BRACKET_THICKNESS + 2*EPSILON, d = BIN_MOUNT_HOLE_DIA, $fn = 20);

    translate([BIN_BRACKET_WIDTH - BIN_MOUNT_HOLE_SPACING_H/2, BIN_BRACKET_THICKNESS/2, 10 + BIN_MOUNT_HOLE_SPACING_V])
      cylinder(h = BIN_BRACKET_THICKNESS + 2*EPSILON, d = BIN_MOUNT_HOLE_DIA, $fn = 20);

    // Relief cutout to reduce weight and material
    translate([BIN_BRACKET_WIDTH/2, BIN_BRACKET_DEPTH/2, BIN_BRACKET_THICKNESS/2])
      cube([BIN_BRACKET_WIDTH - 10, BIN_BRACKET_DEPTH - 10, BIN_BRACKET_THICKNESS], center = true);
  }
}

// ============================================================================
// RENDER SECTION - COMPLETE ASSEMBLY PREVIEW
// ============================================================================

// Belt Side Rails (pair) - shown in assembly position
module rails_assembly() {
  // Left rail (clipped to extrusion)
  translate([0, 0, 20])
    belt_side_rail(RAIL_LENGTH);

  // Right rail (offset by belt width + clip width)
  translate([RAIL_INTERIOR + 2*RAIL_CLIP_WIDTH, 0, 20])
    belt_side_rail(RAIL_LENGTH);
}

// Camera Mount Bracket (mounted above scanning zone)
module camera_mount_assembly() {
  translate([50, 150, 120])
    camera_mount_bracket();
}

// Output Bin Brackets (stacked arrangement)
module bin_brackets_assembly() {
  // Row 1 - bottom
  for (i = [0:1]) {
    translate([i * 110, 0, 0])
      output_bin_bracket();
  }

  // Row 2 - middle (offset height)
  for (i = [0:1]) {
    translate([i * 110, 0, 50])
      output_bin_bracket();
  }

  // Row 3 - top
  for (i = [0:1]) {
    translate([i * 110, 0, 100])
      output_bin_bracket();
  }

  // Row 4 - final (alternative arrangement)
  for (i = [0:1]) {
    translate([i * 110, 0, 150])
      output_bin_bracket();
  }
}

// ============================================================================
// VISUALIZATION - RENDER ALL PARTS
// ============================================================================

// Uncomment individual sections to render specific parts for slicing

// Render belt side rails only
// rails_assembly();

// Render camera mount only
// camera_mount_assembly();

// Render bin brackets only
// bin_brackets_assembly();

// Render all accessories together (full assembly view)
rails_assembly();
camera_mount_assembly();
bin_brackets_assembly();

// ============================================================================
// PRINT INSTRUCTIONS
// ============================================================================

/*

PRINTING GUIDE - LEGO AI SORTING MACHINE ACCESSORIES

PART 1: BELT SIDE RAILS (Print 2x)
=====================================
Print Time: ~1.5 hours per rail
Orientation: Long axis parallel to XY plane (flat on bed)
Support: NONE REQUIRED
Notes:
  - Ensure bed is clean and level for dimensional accuracy
  - Clip feature will snap onto T-slot easily; test fit after printing
  - If rail warps slightly on long runs, use brim to ensure adhesion
  - No post-processing needed; clip edges may be chamfered slightly

PART 2: CAMERA MOUNT BRACKET (Print 1x)
========================================
Print Time: ~45 minutes
Orientation: Flat base plate down on print bed
Support: NONE REQUIRED
Notes:
  - This is a critical optical component; ensure print quality is high
  - Clean any layer lines from top surface where camera will mount
  - Slotted holes allow height adjustment: mount camera, then adjust up/down
  - Mount to scanning chamber top ring using M2.5 socket head cap screws

PART 3: OUTPUT BIN BRACKETS (Print 8x total, recommended: 4 per print job)
==========================================================================
Print Time: ~25 minutes per bracket
Orientation: Back plate flat on print bed (mounting face down)
Support: NONE REQUIRED
Notes:
  - These are non-critical parts; can be printed rapidly
  - M5 hole finish is adequate for tapping extrusion threads
  - Stack brackets at different heights to create bin tower
  - Each bracket can hold ~500g loaded bin; test load capacity before final deployment
  - Light sanding of lip edges recommended for bin fit smoothness

ASSEMBLY SEQUENCE:
===================
1. Print and inspect all parts for dimensional accuracy
2. Install belt side rails onto extrusion T-slots (snap into place)
3. Mount camera bracket to scanning chamber top, adjust height as needed
4. Stack output bin brackets on vertical extrusion uprights at desired heights
5. Place bins into brackets and test stability
6. Final adjustment: shift brackets vertically to optimize bin clearance with gate tree

HARDWARE REQUIRED:
==================
Belt Side Rails: None (snap-fit only)
Camera Mount:
  - 2x M2 socket head cap screw, 8mm length (Pi Camera Module mounting)
  - 3x M2.5 socket head cap screw, 10mm length (mounting ring installation)
Output Bin Brackets:
  - 8x M5 T-nuts (2 per bracket, if not using extrusion tapping)
  - 16x M5 socket head cap screw, 12mm length (4 per bracket pair)

QUALITY CHECKLIST:
==================
[ ] All parts printed flat with no visible supports
[ ] Mounting holes are clean and clear of plastic debris
[ ] Belt side rails snap firmly onto extrusion without wiggling
[ ] Camera bracket base is flat and level (check with straightedge)
[ ] Output bin brackets feel rigid and don't flex under bin weight
[ ] All critical dimensions verified against specifications above

TROUBLESHOOTING:
================
- Clip too tight: File interior surface lightly to reduce friction
- Slotted holes too tight: Drill out with appropriately sized bit
- Bracket warping: Check bed leveling; reprint with brim if needed
- Camera bracket non-level: Use adjustment slots to fine-tune mounting height

*/
